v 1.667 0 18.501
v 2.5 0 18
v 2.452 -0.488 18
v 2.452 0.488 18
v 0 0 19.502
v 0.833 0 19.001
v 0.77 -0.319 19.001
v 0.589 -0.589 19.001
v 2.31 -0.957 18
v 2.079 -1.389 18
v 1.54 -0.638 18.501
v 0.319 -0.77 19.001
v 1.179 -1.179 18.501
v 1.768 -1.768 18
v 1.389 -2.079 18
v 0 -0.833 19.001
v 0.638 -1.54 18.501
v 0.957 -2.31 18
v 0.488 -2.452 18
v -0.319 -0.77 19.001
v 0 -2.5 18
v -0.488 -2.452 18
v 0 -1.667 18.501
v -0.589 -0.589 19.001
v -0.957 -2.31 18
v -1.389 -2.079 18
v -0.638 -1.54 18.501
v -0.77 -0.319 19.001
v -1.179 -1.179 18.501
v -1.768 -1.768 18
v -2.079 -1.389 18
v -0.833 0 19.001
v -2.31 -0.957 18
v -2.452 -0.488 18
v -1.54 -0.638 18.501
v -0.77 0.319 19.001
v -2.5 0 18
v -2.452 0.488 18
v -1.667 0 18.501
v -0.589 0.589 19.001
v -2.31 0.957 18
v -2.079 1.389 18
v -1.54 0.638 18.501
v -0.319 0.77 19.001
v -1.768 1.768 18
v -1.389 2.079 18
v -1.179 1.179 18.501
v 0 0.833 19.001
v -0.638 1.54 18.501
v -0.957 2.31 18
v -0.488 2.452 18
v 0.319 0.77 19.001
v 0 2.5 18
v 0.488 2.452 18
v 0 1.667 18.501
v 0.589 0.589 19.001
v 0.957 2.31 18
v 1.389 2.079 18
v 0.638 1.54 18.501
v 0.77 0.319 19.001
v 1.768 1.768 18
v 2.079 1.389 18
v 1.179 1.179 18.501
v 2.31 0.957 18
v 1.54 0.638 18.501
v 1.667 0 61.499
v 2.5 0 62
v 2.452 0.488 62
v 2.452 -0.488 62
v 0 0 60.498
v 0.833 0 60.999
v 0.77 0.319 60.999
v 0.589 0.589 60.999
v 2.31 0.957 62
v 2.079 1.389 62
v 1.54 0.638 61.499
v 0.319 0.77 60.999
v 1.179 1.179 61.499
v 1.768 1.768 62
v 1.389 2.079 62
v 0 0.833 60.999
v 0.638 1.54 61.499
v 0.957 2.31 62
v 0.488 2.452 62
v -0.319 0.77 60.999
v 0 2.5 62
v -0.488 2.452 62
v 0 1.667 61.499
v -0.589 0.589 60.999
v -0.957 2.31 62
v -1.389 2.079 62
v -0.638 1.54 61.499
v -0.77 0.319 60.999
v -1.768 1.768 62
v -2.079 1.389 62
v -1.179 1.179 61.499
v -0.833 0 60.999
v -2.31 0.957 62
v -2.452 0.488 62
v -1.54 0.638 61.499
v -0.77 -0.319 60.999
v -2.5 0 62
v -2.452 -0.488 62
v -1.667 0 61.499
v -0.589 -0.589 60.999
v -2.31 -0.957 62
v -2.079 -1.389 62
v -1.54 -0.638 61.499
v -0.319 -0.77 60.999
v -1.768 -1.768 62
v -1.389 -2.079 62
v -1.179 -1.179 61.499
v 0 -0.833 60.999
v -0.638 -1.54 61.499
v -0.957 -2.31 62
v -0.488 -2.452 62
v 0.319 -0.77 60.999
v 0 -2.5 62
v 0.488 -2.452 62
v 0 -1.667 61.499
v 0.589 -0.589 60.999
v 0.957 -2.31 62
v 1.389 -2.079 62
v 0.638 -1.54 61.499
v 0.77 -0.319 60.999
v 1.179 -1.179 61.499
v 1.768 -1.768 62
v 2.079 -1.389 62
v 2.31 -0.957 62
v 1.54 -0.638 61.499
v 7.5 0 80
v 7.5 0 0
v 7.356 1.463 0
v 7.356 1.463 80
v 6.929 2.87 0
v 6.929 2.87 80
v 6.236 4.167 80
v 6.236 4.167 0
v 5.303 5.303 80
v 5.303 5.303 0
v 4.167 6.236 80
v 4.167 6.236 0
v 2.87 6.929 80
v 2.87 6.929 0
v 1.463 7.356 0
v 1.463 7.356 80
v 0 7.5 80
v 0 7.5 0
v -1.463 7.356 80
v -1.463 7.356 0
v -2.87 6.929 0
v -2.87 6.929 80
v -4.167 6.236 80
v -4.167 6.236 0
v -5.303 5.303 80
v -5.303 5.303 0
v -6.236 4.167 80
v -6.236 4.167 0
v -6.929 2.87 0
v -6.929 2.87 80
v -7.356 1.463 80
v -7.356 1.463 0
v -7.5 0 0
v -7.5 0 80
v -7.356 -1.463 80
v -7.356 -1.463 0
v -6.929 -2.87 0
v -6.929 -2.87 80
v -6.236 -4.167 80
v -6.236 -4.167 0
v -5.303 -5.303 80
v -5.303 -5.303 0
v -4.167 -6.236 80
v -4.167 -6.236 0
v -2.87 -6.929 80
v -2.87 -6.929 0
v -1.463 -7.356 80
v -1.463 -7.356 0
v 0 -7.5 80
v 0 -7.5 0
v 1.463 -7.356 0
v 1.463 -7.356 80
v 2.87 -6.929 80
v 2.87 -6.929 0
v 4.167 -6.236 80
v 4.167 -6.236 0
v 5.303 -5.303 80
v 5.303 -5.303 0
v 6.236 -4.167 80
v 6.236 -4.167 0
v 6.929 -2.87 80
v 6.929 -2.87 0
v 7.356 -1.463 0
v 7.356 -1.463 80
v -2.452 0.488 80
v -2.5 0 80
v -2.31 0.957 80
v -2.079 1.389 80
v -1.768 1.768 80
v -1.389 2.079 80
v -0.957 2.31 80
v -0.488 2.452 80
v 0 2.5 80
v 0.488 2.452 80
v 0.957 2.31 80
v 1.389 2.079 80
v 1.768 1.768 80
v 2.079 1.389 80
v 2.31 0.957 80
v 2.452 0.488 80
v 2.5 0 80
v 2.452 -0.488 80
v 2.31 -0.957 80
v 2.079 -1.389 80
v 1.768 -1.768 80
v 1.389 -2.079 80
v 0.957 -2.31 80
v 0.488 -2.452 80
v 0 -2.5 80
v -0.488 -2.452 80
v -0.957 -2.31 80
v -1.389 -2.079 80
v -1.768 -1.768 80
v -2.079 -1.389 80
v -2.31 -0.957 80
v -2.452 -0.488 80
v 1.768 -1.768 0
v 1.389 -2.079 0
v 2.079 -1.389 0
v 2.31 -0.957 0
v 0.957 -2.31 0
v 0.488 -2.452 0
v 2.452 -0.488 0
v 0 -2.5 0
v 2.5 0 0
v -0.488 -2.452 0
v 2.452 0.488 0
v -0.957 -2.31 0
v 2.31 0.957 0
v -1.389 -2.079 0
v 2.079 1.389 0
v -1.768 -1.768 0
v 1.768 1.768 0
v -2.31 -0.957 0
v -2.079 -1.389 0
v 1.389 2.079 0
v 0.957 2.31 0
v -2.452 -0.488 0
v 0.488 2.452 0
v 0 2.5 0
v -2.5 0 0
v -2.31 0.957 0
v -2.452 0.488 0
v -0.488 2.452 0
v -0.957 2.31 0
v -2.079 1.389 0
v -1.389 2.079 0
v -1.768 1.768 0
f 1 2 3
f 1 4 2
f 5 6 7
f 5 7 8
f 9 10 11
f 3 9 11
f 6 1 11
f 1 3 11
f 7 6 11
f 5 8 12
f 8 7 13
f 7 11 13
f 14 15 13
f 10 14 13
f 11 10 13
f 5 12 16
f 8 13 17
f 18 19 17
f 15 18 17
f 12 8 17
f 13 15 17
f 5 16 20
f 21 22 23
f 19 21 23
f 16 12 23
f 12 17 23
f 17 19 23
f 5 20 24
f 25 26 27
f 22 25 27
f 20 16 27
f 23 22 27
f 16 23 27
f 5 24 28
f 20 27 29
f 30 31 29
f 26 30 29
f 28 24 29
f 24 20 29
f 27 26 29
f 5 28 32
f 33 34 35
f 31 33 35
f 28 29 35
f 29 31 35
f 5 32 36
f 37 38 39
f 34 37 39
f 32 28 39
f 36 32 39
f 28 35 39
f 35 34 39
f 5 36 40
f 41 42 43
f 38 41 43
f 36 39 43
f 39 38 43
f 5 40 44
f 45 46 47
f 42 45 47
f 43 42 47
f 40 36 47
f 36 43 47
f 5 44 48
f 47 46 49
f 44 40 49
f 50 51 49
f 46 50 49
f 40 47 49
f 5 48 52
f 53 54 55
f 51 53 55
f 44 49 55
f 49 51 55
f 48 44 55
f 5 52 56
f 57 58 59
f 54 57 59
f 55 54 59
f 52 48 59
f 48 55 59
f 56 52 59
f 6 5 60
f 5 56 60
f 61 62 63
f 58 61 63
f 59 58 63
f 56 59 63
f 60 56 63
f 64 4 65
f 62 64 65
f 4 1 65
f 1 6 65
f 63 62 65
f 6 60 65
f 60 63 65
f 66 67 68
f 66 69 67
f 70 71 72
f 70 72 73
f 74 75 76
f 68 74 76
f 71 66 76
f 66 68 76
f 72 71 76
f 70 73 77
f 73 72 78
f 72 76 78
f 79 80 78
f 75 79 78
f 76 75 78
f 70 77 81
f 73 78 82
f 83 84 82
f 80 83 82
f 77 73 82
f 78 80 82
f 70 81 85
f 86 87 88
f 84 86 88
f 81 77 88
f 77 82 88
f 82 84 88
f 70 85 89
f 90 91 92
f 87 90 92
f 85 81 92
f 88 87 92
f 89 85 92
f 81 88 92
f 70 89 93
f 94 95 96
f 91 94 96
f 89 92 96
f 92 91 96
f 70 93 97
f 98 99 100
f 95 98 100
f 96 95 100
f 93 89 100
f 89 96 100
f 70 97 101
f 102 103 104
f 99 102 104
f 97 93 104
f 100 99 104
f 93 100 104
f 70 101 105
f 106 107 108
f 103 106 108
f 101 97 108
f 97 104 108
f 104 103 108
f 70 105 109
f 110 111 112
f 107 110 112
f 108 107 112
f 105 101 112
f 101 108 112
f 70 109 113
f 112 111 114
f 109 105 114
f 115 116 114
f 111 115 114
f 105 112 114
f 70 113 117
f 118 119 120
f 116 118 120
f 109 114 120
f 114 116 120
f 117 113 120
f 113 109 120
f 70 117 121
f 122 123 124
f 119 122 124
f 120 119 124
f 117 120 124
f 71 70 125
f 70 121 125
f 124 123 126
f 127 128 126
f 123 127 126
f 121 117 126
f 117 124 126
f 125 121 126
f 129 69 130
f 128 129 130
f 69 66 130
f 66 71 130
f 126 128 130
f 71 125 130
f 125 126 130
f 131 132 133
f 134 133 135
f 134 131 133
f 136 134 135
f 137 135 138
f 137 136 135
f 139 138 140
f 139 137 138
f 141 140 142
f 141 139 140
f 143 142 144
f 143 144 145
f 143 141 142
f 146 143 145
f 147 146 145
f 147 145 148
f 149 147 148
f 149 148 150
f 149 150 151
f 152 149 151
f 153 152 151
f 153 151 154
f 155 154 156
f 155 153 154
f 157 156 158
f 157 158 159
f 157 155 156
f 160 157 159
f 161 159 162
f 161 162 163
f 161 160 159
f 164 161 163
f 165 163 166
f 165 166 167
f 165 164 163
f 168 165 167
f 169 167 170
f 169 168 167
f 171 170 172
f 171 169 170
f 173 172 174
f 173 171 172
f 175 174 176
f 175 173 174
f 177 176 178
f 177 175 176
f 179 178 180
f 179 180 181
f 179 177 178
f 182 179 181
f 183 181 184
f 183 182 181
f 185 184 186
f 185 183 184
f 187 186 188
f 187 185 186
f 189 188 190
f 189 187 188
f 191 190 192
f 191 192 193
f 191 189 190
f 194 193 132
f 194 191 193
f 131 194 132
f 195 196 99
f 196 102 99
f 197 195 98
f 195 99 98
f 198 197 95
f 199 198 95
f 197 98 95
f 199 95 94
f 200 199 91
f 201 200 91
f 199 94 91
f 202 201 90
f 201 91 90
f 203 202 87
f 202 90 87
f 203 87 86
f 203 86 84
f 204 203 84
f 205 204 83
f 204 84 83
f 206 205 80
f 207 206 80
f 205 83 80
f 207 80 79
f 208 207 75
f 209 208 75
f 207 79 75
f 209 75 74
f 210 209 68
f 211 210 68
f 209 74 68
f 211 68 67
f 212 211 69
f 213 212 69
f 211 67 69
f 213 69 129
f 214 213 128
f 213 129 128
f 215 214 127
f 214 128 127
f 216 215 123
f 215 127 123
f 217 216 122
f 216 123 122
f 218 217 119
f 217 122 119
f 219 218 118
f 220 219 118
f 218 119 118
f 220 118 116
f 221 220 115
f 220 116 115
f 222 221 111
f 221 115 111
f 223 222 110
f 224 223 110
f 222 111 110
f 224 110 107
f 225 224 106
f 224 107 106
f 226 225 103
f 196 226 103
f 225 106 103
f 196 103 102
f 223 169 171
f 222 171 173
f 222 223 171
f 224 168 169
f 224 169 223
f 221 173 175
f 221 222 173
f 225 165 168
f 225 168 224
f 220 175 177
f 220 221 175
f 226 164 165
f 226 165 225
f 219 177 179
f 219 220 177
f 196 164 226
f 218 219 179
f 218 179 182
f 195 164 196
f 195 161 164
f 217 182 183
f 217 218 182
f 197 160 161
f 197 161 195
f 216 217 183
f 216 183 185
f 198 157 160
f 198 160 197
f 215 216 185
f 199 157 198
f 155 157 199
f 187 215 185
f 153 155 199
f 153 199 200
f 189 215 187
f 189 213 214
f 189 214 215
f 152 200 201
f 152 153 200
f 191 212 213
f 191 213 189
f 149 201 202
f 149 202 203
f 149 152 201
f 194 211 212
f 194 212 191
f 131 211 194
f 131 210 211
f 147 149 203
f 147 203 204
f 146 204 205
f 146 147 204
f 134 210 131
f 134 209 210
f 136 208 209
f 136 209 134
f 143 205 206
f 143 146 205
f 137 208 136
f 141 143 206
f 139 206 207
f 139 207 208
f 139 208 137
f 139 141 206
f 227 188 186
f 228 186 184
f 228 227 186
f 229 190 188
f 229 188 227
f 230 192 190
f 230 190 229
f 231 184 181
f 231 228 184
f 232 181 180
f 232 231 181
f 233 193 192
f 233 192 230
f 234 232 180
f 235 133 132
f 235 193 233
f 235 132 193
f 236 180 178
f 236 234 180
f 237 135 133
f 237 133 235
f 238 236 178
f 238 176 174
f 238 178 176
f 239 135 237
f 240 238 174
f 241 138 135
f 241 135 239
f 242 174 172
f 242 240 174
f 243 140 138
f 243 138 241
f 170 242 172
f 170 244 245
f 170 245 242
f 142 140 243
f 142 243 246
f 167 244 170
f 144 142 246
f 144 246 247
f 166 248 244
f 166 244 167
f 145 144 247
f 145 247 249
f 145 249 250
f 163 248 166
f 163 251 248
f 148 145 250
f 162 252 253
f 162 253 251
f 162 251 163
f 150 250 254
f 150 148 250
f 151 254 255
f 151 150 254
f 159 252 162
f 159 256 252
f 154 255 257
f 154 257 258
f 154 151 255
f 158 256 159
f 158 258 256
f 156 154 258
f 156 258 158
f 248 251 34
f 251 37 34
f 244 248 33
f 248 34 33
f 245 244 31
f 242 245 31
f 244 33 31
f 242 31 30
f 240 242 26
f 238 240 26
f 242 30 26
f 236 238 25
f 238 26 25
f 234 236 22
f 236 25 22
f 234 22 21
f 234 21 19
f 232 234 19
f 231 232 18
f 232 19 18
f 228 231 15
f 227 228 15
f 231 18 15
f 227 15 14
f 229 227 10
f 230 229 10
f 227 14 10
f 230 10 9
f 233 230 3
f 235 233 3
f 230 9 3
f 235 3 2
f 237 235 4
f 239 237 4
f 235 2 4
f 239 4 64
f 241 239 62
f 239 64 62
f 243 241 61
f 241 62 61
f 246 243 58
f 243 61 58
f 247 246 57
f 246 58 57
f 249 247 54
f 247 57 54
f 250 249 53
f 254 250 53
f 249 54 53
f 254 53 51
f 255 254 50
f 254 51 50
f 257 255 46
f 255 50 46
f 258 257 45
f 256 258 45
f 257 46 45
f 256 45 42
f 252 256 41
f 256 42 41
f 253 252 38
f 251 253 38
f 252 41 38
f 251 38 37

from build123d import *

# Parameters (mm, degrees)
F3_D     = 5
F3_DEPTH = 18
F3_TIP   = 1.5021515476
F5_D     = 5
F5_DEPTH = 18
F5_TIP   = 1.5021515476


with BuildPart() as f1:
    # F0 (on Front) → F1 (revolve)
    with BuildSketch(Plane.XZ):
        Polygon((7.5, 80), (2, 80), (2, 65), (0, 65), (0, 15), (2, 15), (2, 0), (7.5, 0), align=None)
    revolve(axis=Axis((0, 0, 48.5607869923), (0, 0, 1)))

    # F3
    with Locations(Plane.XY.offset(80)):
        with Locations((0, 0)):
            Hole(F3_D / 2, depth=F3_DEPTH)
            with Locations((0, 0, -(F3_DEPTH + F3_TIP / 2))):  # 118° drill point
                Cone(0, F3_D / 2, F3_TIP, mode=Mode.SUBTRACT)

    # F5
    with Locations(Plane(origin=(0, 0, 0), x_dir=(1, 0, 0), z_dir=(0, 0, -1))):
        with Locations((0, 0)):
            Hole(F5_D / 2, depth=F5_DEPTH)
            with Locations((0, 0, -(F5_DEPTH + F5_TIP / 2))):  # 118° drill point
                Cone(0, F5_D / 2, F5_TIP, mode=Mode.SUBTRACT)


solid = f1.part
